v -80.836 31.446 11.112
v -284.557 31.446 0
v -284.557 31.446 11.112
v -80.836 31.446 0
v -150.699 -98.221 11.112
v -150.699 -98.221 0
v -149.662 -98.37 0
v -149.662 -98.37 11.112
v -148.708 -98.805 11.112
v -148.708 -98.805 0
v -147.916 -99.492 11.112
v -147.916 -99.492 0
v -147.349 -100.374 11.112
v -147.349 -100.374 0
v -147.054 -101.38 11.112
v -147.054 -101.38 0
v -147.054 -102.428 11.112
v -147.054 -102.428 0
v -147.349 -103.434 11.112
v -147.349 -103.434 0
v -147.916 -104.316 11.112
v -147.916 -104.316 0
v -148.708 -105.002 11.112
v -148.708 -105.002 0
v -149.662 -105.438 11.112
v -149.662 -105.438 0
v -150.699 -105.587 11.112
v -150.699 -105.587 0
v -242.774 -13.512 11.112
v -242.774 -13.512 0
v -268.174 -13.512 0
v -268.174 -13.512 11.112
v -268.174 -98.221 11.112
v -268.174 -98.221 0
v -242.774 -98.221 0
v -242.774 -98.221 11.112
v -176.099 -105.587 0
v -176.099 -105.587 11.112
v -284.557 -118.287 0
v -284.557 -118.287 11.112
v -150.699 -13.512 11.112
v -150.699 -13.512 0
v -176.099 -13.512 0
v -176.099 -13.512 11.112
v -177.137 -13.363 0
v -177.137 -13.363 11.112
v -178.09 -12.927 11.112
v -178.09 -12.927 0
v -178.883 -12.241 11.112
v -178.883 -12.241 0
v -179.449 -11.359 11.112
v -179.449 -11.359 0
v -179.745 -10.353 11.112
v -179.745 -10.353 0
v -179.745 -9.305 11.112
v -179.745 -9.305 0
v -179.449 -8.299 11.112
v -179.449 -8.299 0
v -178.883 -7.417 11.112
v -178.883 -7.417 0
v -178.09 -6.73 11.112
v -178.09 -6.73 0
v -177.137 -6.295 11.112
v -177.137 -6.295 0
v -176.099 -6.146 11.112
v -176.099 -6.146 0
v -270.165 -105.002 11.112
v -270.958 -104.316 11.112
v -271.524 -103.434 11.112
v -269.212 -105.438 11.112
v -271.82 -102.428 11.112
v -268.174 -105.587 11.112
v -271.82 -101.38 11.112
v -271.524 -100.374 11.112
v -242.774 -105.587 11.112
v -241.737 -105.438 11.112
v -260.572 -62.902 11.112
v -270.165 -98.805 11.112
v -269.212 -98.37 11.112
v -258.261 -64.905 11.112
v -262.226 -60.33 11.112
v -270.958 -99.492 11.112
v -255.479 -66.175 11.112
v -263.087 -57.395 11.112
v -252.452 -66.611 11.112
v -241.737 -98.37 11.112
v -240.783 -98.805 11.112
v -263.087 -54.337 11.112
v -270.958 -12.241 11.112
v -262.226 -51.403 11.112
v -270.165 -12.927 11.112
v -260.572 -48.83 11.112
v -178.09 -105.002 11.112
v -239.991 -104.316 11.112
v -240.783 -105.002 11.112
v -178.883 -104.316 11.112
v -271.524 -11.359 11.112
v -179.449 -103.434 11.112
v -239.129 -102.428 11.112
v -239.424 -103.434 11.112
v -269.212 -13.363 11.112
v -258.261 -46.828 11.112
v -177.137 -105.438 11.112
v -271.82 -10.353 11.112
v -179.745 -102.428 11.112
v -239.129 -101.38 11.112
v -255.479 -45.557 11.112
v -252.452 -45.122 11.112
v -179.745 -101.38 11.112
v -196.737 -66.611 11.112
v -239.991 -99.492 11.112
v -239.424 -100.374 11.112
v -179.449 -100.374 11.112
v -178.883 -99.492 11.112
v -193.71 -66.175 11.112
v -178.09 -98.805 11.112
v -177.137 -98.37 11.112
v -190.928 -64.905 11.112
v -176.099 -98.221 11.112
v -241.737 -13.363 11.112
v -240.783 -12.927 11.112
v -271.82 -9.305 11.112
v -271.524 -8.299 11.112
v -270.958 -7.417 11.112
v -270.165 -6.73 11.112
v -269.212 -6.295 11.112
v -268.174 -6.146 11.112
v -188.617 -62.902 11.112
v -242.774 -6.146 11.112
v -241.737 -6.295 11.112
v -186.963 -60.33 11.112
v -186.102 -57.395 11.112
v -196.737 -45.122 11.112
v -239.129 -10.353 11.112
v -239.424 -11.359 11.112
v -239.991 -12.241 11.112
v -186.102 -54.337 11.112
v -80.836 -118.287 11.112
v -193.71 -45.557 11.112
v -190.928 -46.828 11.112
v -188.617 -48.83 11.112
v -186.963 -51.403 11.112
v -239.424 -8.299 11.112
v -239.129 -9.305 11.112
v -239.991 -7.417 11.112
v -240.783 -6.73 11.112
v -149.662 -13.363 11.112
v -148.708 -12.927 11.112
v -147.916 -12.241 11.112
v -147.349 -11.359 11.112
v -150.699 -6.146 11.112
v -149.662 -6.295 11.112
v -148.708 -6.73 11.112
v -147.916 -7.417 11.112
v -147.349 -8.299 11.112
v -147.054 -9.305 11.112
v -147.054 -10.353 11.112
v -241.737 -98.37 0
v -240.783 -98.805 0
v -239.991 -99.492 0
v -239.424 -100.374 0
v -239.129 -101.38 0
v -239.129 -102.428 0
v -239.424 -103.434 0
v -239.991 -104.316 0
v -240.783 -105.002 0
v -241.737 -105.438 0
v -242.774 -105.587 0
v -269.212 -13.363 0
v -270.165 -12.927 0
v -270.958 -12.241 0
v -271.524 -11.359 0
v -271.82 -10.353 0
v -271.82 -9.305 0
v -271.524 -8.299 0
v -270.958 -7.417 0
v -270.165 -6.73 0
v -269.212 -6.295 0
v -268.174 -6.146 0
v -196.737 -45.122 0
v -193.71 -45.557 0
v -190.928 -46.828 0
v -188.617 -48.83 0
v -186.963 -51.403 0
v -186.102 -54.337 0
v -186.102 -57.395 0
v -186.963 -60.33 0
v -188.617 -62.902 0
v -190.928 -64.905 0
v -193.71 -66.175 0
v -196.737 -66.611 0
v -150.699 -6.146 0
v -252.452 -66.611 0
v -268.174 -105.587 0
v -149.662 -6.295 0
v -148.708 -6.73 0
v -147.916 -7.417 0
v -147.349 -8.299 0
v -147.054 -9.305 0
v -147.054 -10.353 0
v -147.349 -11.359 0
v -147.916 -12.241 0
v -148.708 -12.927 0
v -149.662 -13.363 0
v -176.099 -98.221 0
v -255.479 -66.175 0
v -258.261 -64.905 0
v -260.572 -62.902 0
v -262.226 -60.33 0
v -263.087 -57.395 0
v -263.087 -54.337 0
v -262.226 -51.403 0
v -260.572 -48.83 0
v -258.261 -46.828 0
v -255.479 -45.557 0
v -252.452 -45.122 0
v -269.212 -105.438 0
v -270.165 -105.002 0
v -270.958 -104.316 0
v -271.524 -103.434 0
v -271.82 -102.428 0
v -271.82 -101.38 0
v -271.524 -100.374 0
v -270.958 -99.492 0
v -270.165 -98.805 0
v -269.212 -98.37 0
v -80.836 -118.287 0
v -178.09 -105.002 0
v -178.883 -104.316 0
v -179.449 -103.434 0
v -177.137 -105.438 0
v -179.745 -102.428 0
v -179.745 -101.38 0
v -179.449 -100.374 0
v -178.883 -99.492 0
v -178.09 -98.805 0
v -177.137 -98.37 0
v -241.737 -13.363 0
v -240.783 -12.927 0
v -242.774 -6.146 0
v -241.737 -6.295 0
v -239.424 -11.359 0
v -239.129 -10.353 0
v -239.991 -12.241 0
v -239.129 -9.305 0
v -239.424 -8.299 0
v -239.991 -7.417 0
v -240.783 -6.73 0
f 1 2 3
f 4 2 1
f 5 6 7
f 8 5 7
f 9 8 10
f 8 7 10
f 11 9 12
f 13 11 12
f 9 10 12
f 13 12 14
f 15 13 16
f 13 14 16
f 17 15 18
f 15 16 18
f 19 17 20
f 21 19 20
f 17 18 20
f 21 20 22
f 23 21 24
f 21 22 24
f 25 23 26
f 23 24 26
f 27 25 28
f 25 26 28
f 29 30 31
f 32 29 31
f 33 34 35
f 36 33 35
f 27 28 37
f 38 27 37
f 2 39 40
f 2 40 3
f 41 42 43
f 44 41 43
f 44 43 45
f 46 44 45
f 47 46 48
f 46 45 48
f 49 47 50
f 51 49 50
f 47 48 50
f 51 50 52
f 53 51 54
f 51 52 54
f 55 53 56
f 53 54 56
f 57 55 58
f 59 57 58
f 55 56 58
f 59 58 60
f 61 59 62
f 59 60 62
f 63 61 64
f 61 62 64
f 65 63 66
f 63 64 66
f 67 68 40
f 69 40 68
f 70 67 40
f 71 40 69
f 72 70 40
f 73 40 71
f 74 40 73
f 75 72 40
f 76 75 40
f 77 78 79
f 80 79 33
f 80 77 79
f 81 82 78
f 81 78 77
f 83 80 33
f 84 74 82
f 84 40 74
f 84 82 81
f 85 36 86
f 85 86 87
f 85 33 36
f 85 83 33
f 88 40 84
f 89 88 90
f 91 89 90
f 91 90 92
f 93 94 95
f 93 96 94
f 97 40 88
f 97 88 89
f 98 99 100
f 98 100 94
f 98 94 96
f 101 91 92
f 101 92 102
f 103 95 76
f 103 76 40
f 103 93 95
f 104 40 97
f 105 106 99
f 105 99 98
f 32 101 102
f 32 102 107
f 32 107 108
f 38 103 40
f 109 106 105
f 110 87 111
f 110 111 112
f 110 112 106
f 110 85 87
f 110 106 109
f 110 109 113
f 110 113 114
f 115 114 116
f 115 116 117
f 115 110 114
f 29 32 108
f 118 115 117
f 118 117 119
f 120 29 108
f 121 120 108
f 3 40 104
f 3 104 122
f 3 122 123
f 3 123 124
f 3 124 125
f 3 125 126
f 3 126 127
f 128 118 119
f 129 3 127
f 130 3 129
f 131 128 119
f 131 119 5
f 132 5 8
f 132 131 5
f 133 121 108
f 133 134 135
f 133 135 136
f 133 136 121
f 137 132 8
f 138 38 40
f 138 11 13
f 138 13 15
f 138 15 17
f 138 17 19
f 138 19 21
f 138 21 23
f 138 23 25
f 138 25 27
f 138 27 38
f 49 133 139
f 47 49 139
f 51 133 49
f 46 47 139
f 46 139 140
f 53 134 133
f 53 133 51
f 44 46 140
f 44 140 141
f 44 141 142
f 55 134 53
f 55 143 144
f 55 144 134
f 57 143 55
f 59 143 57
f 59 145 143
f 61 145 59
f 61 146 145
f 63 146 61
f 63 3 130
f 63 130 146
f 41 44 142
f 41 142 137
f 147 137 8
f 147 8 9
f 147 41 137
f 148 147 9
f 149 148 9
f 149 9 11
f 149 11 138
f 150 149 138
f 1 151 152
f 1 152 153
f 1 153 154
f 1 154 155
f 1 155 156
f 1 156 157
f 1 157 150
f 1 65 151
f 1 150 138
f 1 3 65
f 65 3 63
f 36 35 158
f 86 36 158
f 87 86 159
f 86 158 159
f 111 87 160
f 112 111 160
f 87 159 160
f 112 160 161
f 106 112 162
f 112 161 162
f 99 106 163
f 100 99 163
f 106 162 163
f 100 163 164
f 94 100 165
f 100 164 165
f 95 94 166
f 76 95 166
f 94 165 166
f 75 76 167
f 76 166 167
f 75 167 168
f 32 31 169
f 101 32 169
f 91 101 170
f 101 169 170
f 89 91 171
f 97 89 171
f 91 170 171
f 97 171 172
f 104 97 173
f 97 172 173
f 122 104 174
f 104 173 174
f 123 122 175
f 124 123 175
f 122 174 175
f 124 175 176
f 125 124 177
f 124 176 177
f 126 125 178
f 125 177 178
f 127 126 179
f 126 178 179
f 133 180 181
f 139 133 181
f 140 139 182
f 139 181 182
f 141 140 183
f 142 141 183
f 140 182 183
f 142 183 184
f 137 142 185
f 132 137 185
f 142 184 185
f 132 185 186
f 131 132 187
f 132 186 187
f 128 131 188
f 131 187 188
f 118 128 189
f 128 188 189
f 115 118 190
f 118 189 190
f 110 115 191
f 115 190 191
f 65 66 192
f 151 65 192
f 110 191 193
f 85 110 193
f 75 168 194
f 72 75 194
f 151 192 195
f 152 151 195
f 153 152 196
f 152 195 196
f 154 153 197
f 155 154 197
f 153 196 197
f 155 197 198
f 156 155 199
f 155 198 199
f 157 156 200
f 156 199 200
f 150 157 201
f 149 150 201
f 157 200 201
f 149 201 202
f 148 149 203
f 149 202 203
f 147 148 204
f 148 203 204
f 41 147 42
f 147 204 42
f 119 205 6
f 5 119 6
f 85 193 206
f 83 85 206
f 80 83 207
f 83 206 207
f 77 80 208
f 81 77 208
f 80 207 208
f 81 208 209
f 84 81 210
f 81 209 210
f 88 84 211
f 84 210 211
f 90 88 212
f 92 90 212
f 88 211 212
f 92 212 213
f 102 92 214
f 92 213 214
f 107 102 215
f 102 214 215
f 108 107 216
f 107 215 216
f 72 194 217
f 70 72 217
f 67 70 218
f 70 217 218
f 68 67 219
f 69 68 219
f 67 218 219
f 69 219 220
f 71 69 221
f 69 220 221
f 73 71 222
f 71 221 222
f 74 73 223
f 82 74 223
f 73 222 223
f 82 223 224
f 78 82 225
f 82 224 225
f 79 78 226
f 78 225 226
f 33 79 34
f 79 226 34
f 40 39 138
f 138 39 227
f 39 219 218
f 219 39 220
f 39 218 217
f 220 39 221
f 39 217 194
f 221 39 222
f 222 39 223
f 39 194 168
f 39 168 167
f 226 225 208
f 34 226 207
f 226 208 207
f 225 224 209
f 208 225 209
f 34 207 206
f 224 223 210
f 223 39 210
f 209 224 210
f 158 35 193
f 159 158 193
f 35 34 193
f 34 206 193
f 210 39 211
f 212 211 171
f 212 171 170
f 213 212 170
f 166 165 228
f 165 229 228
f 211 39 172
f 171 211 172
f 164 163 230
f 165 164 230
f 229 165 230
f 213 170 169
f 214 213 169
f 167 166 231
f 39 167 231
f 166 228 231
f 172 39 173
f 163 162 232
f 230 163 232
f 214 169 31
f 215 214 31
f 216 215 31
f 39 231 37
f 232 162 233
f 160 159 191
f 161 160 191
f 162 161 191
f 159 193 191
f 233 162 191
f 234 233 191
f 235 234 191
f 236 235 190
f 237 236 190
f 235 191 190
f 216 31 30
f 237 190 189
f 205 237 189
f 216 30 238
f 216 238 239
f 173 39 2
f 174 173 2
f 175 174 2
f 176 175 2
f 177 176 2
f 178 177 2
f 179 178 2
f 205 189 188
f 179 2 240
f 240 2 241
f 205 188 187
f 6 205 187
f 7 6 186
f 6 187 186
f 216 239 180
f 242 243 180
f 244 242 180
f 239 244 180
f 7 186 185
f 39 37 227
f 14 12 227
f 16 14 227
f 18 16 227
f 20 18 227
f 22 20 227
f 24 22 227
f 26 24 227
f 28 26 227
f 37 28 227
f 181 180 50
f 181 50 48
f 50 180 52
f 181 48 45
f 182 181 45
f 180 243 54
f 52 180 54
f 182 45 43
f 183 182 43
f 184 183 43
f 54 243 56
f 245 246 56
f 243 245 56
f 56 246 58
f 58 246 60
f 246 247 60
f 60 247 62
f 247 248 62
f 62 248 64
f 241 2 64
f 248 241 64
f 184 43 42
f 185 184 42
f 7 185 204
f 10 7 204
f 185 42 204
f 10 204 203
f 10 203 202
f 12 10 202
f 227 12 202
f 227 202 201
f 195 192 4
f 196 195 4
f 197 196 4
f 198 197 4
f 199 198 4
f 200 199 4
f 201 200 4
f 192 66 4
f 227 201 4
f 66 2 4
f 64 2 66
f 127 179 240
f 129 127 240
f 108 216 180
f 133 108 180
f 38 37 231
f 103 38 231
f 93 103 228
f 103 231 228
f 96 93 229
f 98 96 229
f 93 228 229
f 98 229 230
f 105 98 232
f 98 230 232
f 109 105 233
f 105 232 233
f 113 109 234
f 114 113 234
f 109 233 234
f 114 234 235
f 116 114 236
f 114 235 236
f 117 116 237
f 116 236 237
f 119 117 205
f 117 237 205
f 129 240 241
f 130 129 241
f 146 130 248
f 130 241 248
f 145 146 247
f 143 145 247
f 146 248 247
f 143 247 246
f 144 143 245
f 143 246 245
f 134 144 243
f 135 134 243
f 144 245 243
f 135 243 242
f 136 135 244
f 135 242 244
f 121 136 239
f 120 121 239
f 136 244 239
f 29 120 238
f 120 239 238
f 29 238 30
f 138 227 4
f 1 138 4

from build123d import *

# Parameters (mm, degrees)
SKETCH1_W           = 203.721686737
SKETCH1_H           = 149.733
BOSS_EXTRUDE1_DEPTH = 11.1125


with BuildPart() as part:
    # Sketch1 → Boss-Extrude1 (new body)
    with BuildSketch(Plane.XY):
        with Locations((-182.696343369, -43.420313263)):
            Rectangle(SKETCH1_W, SKETCH1_H)
        with BuildLine():
            Line((-242.774186737, -105.586813263), (-268.174186737, -105.586813263))
            ThreePointArc((-268.174186737, -105.586813263), (-271.857186737, -101.903813263), (-268.174186737, -98.220813263))
            Line((-268.174186737, -98.220813263), (-242.774186737, -98.220813263))
            ThreePointArc((-242.774186737, -98.220813263), (-239.091186737, -101.903813263), (-242.774186737, -105.586813263))
        make_face(mode=Mode.SUBTRACT)
        with BuildLine():
            Line((-242.774186737, -13.511813263), (-268.174186737, -13.511813263))
            ThreePointArc((-268.174186737, -13.511813263), (-271.857186737, -9.828813263), (-268.174186737, -6.145813263))
            Line((-268.174186737, -6.145813263), (-242.774186737, -6.145813263))
            ThreePointArc((-242.774186737, -6.145813263), (-239.091186737, -9.828813263), (-242.774186737, -13.511813263))
        make_face(mode=Mode.SUBTRACT)
        with BuildLine():
            Line((-150.699186737, -13.511813263), (-176.099186737, -13.511813263))
            ThreePointArc((-176.099186737, -13.511813263), (-179.782186737, -9.828813263), (-176.099186737, -6.145813263))
            Line((-176.099186737, -6.145813263), (-150.699186737, -6.145813263))
            ThreePointArc((-150.699186737, -6.145813263), (-147.016186737, -9.828813263), (-150.699186737, -13.511813263))
        make_face(mode=Mode.SUBTRACT)
        with BuildLine():
            Line((-150.699186737, -105.586813263), (-176.099186737, -105.586813263))
            ThreePointArc((-176.099186737, -105.586813263), (-179.782186737, -101.903813263), (-176.099186737, -98.220813263))
            Line((-176.099186737, -98.220813263), (-150.699186737, -98.220813263))
            ThreePointArc((-150.699186737, -98.220813263), (-147.016186737, -101.903813263), (-150.699186737, -105.586813263))
        make_face(mode=Mode.SUBTRACT)
        with BuildLine():
            Line((-196.736686737, -66.610669433), (-252.452295744, -66.610669433))
            ThreePointArc((-252.452295744, -66.610669433), (-263.196651914, -55.866313263), (-252.452295744, -45.121957093))
            Line((-252.452295744, -45.121957093), (-196.736686737, -45.121957093))
            ThreePointArc((-196.736686737, -45.121957093), (-185.992330568, -55.866313263), (-196.736686737, -66.610669433))
        make_face(mode=Mode.SUBTRACT)
    extrude(amount=BOSS_EXTRUDE1_DEPTH)


solid = part.part
